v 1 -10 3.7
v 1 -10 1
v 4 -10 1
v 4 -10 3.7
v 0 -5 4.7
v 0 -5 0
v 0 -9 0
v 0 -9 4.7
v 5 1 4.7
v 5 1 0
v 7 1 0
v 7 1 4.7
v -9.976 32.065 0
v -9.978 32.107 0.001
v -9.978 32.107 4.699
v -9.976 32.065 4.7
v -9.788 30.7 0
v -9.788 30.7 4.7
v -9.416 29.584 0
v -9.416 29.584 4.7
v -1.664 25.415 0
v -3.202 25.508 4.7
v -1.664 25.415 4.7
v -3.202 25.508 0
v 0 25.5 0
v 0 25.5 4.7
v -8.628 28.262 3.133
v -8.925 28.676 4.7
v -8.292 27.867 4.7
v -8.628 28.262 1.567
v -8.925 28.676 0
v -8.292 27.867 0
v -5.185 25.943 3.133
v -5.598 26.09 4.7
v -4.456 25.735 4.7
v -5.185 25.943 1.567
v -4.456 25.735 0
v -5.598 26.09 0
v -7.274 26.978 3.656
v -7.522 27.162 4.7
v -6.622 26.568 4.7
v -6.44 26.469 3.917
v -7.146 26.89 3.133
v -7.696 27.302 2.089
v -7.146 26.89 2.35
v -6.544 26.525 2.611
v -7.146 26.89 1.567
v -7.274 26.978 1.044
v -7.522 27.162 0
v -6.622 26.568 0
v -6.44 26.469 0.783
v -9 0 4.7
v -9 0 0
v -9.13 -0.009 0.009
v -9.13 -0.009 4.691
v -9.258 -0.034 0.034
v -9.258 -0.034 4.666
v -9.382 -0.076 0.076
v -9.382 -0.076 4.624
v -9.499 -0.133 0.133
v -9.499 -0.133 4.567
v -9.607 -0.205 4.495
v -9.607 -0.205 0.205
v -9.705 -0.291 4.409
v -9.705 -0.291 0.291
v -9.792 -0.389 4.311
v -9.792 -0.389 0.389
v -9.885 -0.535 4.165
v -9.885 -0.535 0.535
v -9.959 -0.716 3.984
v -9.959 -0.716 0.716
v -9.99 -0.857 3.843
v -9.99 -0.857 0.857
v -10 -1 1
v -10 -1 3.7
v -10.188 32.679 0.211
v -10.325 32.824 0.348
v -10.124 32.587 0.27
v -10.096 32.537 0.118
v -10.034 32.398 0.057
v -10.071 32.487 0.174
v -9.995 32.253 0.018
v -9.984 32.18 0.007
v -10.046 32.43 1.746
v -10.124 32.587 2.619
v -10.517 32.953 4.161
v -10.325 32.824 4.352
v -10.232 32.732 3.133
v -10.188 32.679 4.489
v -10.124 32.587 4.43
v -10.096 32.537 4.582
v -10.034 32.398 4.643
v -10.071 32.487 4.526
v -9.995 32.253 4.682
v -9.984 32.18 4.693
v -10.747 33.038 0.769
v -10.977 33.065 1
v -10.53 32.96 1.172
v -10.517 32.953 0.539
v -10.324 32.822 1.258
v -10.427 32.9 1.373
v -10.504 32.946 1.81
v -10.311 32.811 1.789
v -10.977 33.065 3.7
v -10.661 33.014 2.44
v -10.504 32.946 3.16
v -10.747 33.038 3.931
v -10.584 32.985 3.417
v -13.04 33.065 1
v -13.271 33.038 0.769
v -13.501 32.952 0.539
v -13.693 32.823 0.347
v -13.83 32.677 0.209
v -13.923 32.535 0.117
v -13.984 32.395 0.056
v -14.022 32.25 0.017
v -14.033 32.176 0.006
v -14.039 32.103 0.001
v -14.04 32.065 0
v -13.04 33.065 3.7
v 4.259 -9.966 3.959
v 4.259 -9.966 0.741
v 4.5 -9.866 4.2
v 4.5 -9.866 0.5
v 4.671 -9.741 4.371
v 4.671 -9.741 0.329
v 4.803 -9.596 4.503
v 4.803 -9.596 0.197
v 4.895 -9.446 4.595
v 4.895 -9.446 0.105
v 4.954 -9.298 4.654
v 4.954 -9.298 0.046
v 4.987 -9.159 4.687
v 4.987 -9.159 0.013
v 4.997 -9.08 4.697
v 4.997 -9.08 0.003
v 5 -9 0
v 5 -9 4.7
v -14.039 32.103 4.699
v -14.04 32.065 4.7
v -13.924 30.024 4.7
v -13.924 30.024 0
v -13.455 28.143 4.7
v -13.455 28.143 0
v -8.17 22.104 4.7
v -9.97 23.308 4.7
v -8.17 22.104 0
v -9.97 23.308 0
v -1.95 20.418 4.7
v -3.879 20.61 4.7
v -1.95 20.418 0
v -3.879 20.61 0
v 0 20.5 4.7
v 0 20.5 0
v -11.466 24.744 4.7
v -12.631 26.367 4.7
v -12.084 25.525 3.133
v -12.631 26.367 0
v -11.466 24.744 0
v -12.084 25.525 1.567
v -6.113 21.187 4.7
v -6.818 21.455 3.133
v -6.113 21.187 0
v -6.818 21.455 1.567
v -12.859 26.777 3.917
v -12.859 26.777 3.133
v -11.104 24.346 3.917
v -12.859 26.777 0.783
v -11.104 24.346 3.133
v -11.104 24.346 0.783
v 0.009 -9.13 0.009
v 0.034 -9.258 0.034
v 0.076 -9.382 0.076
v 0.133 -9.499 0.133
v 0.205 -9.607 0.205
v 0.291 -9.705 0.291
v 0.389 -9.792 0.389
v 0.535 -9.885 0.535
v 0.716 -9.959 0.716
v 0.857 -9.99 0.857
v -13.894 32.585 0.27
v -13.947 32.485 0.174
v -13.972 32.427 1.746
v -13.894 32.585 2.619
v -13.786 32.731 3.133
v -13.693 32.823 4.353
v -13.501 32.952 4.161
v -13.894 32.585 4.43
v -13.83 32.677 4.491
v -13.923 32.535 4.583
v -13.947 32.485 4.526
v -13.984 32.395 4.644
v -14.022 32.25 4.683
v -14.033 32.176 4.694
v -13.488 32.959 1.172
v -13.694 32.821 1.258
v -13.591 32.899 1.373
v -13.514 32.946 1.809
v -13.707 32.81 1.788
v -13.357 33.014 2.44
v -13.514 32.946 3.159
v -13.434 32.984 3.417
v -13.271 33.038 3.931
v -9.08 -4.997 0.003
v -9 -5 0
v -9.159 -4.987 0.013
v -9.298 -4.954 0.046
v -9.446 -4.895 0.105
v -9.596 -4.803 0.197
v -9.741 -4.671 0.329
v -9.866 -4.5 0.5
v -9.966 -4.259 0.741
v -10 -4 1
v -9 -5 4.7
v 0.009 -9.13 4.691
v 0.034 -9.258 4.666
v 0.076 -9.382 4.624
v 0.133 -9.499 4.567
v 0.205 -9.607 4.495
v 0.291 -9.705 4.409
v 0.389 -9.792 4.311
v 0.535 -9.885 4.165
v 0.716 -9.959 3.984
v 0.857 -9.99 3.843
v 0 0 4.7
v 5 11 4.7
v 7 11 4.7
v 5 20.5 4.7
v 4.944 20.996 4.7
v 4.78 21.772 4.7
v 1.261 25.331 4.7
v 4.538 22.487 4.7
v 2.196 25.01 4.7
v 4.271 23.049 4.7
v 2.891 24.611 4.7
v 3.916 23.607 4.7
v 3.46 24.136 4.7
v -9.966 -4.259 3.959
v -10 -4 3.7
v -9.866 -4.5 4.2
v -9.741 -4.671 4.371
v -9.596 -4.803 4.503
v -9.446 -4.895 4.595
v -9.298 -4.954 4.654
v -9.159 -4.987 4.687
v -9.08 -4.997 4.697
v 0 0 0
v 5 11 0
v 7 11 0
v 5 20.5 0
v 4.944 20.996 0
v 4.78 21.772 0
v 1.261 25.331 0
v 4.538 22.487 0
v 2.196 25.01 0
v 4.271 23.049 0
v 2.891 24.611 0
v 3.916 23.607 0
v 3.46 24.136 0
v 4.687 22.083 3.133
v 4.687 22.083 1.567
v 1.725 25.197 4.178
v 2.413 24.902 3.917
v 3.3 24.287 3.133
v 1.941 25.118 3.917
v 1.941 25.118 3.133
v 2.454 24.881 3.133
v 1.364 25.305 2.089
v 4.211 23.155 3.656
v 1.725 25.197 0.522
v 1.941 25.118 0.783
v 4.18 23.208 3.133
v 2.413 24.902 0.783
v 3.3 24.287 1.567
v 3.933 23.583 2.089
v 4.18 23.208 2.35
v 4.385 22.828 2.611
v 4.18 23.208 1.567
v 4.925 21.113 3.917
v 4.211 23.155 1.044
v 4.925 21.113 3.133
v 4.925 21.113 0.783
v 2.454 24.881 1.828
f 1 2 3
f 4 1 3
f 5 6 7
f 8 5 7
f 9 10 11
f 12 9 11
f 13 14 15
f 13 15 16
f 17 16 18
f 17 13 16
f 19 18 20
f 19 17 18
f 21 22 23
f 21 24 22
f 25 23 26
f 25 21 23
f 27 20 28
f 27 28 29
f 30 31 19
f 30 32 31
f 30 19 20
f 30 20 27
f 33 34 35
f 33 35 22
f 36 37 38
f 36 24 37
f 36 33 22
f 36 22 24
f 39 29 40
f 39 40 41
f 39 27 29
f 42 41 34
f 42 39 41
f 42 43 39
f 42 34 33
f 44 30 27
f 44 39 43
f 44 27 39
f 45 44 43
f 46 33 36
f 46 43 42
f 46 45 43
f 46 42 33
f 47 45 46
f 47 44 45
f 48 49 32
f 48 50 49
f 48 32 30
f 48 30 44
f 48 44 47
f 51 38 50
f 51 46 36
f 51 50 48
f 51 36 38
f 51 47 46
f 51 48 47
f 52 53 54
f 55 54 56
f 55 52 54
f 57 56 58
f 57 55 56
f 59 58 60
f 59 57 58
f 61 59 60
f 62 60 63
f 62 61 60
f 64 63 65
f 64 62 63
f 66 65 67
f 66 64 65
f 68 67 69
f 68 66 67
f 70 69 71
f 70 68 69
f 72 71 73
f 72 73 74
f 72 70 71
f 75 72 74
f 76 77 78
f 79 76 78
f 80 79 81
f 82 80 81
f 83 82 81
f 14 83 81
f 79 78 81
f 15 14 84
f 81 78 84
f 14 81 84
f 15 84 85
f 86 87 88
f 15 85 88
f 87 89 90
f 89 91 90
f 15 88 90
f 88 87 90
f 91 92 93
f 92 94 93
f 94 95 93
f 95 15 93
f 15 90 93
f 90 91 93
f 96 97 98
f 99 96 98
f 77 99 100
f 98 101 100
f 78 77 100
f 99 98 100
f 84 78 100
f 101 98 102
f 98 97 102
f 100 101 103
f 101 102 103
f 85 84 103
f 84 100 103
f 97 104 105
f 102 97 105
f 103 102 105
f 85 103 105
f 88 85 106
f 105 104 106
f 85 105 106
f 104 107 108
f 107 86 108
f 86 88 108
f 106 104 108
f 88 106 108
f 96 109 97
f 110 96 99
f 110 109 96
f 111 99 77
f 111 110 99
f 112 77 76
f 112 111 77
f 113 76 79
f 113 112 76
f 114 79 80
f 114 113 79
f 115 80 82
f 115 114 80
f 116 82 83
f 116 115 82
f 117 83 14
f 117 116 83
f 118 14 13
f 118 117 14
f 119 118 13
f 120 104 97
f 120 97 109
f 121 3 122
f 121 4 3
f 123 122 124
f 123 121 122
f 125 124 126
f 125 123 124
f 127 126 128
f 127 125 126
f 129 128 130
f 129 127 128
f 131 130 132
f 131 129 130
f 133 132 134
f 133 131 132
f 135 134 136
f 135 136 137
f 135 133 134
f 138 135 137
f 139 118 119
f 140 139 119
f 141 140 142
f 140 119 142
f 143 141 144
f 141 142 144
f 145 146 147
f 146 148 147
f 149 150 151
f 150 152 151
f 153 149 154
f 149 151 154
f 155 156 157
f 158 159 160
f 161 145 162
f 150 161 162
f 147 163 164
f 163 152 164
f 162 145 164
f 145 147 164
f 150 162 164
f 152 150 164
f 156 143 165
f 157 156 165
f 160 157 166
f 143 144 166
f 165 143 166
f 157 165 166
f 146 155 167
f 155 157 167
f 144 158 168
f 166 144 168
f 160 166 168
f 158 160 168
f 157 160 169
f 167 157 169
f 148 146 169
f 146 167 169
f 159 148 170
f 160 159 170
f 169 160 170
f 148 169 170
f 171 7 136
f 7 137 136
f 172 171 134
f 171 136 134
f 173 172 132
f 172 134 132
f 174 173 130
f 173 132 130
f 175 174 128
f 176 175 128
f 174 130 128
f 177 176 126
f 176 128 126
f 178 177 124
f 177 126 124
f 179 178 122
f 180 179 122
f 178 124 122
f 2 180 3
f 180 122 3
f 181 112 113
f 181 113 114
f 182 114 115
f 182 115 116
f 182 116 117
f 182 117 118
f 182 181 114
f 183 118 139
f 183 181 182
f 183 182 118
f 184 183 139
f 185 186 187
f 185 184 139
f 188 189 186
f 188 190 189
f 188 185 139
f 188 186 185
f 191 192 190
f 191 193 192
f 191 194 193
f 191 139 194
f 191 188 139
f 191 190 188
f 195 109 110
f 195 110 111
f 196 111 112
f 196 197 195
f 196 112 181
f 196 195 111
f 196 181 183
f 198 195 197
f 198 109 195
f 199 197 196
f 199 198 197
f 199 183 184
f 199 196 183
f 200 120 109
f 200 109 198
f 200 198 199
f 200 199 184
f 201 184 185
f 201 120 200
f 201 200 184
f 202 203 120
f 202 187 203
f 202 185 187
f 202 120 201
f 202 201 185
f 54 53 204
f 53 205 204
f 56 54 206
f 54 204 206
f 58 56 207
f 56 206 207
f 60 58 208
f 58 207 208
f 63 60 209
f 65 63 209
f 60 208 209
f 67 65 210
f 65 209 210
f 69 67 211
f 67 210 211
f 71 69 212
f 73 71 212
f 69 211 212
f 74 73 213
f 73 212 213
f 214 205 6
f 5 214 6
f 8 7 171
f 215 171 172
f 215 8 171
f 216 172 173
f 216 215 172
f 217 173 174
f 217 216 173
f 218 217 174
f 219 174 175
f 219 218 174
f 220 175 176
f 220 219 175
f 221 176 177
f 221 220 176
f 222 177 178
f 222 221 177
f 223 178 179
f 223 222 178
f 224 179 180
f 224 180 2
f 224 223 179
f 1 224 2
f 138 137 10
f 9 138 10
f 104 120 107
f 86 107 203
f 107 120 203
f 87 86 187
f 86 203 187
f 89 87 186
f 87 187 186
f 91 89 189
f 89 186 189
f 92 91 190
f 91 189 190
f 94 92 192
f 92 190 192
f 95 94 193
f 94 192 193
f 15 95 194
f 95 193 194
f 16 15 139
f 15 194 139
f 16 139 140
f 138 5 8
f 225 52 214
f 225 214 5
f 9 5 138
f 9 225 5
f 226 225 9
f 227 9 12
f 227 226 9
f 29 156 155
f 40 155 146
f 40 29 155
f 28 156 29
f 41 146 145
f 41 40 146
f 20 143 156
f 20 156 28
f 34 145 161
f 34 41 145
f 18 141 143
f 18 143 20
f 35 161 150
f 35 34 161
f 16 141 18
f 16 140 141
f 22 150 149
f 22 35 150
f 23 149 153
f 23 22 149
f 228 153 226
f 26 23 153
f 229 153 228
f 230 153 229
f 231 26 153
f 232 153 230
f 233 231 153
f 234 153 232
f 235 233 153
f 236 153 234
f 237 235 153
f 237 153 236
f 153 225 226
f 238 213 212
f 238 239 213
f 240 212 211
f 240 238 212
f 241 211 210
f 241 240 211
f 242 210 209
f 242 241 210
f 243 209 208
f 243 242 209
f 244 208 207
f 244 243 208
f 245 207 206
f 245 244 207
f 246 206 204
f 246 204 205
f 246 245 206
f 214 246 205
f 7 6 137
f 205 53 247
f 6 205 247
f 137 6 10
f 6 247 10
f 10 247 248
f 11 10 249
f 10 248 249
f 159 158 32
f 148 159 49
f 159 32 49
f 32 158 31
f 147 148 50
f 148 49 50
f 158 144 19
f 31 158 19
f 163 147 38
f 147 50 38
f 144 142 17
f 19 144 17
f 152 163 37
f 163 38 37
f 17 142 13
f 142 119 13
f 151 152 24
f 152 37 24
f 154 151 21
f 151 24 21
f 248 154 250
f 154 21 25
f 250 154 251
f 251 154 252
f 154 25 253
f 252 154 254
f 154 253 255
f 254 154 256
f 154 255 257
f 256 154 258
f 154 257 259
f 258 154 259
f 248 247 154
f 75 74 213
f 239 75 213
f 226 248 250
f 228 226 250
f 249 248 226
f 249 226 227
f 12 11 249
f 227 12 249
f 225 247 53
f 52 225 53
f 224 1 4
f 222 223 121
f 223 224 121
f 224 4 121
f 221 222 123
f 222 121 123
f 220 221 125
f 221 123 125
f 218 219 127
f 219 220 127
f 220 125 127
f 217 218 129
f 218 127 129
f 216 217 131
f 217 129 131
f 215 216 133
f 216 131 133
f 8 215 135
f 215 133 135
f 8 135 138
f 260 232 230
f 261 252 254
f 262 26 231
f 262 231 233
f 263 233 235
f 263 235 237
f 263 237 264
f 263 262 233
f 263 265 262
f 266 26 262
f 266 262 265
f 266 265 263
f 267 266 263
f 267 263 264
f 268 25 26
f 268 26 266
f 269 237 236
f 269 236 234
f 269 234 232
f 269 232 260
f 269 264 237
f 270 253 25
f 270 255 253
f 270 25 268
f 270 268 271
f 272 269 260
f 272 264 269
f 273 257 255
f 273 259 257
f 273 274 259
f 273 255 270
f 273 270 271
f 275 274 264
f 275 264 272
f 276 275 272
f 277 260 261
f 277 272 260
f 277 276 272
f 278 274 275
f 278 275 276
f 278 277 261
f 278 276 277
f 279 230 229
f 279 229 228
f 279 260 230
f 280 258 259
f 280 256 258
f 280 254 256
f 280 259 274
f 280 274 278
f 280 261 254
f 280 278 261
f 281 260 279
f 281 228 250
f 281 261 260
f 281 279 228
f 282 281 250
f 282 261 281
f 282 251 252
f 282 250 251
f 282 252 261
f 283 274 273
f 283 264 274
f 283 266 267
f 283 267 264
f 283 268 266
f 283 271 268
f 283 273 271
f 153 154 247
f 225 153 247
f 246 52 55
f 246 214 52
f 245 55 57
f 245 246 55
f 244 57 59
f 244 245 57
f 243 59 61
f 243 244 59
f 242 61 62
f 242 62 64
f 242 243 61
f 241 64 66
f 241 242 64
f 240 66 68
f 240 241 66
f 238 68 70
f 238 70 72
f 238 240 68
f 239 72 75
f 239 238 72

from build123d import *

# Parameters (mm, degrees)
F0_W     = 2
F0_H     = 10
F1_DEPTH = 4.7
F2_R     = 1
F3_R     = 1
F4_R     = 1


with BuildPart() as f1:
    # F0 (on Top) → F1 (new body)
    with BuildSketch(Plane.XY):
        with BuildLine():
            Line((-9.963439, 33.065276), (-13.963439, 33.065276))
            add(Edge.make_bspline(
                [(-13.963439, 33.065276), (-14.933051, 24.878523), (-7.296724, 19.661296), (0, 20.5)],
                knots=[0, 0, 0, 0, 18.784669, 18.784669, 18.784669, 18.784669], degree=3))
            Line((0, 20.5), (0, 0))
            Line((0, 0), (-10, 0))
            Line((-10, 0), (-10, -5))
            Line((-10, -5), (0, -5))
            Line((0, -5), (0, -10))
            Line((0, -10), (5, -10))
            Line((5, -10), (5, 1))
            Line((5, 1), (5, 11))
            Line((5, 11), (5, 20.5))
            add(Edge.make_bspline(
                [(0, 25.5), (4.53556, 25.319498), (4.944229, 21.235214), (5, 20.5)],
                knots=[0, 0, 0, 0, 7.071068, 7.071068, 7.071068, 7.071068], degree=3))
            add(Edge.make_bspline(
                [(-9.963439, 33.065276), (-10.31617, 28.009873), (-6.350763, 24.845181), (0, 25.5)],
                knots=[0, 0, 0, 0, 12.510137, 12.510137, 12.510137, 12.510137], degree=3))
        make_face()
        with Locations((6, 6)):
            Rectangle(F0_W, F0_H)
    extrude(amount=F1_DEPTH)

    # F2
    f2_edges = [f1.edges().sort_by_distance(p)[0] for p in [
        (-9.963439, 33.065276, 2.35),
        (-13.963439, 33.065276, 2.35),
        (-11.963439, 33.065276, 0),
        (-11.963439, 33.065276, 4.7),
    ]]
    fillet(f2_edges, radius=F2_R)

    # F3
    f3_edges = [f1.edges().sort_by_distance(p)[0] for p in [
        (-10, 0, 2.35),
        (-10, -5, 2.35),
        (-10, -2.5, 0),
        (-10, -2.5, 4.7),
    ]]
    fillet(f3_edges, radius=F3_R)

    # F4
    f4_edges = [f1.edges().sort_by_distance(p)[0] for p in [
        (0, -10, 2.35),
        (5, -10, 2.35),
        (2.5, -10, 0),
        (2.5, -10, 4.7),
    ]]
    fillet(f4_edges, radius=F4_R)


solid = f1.part
